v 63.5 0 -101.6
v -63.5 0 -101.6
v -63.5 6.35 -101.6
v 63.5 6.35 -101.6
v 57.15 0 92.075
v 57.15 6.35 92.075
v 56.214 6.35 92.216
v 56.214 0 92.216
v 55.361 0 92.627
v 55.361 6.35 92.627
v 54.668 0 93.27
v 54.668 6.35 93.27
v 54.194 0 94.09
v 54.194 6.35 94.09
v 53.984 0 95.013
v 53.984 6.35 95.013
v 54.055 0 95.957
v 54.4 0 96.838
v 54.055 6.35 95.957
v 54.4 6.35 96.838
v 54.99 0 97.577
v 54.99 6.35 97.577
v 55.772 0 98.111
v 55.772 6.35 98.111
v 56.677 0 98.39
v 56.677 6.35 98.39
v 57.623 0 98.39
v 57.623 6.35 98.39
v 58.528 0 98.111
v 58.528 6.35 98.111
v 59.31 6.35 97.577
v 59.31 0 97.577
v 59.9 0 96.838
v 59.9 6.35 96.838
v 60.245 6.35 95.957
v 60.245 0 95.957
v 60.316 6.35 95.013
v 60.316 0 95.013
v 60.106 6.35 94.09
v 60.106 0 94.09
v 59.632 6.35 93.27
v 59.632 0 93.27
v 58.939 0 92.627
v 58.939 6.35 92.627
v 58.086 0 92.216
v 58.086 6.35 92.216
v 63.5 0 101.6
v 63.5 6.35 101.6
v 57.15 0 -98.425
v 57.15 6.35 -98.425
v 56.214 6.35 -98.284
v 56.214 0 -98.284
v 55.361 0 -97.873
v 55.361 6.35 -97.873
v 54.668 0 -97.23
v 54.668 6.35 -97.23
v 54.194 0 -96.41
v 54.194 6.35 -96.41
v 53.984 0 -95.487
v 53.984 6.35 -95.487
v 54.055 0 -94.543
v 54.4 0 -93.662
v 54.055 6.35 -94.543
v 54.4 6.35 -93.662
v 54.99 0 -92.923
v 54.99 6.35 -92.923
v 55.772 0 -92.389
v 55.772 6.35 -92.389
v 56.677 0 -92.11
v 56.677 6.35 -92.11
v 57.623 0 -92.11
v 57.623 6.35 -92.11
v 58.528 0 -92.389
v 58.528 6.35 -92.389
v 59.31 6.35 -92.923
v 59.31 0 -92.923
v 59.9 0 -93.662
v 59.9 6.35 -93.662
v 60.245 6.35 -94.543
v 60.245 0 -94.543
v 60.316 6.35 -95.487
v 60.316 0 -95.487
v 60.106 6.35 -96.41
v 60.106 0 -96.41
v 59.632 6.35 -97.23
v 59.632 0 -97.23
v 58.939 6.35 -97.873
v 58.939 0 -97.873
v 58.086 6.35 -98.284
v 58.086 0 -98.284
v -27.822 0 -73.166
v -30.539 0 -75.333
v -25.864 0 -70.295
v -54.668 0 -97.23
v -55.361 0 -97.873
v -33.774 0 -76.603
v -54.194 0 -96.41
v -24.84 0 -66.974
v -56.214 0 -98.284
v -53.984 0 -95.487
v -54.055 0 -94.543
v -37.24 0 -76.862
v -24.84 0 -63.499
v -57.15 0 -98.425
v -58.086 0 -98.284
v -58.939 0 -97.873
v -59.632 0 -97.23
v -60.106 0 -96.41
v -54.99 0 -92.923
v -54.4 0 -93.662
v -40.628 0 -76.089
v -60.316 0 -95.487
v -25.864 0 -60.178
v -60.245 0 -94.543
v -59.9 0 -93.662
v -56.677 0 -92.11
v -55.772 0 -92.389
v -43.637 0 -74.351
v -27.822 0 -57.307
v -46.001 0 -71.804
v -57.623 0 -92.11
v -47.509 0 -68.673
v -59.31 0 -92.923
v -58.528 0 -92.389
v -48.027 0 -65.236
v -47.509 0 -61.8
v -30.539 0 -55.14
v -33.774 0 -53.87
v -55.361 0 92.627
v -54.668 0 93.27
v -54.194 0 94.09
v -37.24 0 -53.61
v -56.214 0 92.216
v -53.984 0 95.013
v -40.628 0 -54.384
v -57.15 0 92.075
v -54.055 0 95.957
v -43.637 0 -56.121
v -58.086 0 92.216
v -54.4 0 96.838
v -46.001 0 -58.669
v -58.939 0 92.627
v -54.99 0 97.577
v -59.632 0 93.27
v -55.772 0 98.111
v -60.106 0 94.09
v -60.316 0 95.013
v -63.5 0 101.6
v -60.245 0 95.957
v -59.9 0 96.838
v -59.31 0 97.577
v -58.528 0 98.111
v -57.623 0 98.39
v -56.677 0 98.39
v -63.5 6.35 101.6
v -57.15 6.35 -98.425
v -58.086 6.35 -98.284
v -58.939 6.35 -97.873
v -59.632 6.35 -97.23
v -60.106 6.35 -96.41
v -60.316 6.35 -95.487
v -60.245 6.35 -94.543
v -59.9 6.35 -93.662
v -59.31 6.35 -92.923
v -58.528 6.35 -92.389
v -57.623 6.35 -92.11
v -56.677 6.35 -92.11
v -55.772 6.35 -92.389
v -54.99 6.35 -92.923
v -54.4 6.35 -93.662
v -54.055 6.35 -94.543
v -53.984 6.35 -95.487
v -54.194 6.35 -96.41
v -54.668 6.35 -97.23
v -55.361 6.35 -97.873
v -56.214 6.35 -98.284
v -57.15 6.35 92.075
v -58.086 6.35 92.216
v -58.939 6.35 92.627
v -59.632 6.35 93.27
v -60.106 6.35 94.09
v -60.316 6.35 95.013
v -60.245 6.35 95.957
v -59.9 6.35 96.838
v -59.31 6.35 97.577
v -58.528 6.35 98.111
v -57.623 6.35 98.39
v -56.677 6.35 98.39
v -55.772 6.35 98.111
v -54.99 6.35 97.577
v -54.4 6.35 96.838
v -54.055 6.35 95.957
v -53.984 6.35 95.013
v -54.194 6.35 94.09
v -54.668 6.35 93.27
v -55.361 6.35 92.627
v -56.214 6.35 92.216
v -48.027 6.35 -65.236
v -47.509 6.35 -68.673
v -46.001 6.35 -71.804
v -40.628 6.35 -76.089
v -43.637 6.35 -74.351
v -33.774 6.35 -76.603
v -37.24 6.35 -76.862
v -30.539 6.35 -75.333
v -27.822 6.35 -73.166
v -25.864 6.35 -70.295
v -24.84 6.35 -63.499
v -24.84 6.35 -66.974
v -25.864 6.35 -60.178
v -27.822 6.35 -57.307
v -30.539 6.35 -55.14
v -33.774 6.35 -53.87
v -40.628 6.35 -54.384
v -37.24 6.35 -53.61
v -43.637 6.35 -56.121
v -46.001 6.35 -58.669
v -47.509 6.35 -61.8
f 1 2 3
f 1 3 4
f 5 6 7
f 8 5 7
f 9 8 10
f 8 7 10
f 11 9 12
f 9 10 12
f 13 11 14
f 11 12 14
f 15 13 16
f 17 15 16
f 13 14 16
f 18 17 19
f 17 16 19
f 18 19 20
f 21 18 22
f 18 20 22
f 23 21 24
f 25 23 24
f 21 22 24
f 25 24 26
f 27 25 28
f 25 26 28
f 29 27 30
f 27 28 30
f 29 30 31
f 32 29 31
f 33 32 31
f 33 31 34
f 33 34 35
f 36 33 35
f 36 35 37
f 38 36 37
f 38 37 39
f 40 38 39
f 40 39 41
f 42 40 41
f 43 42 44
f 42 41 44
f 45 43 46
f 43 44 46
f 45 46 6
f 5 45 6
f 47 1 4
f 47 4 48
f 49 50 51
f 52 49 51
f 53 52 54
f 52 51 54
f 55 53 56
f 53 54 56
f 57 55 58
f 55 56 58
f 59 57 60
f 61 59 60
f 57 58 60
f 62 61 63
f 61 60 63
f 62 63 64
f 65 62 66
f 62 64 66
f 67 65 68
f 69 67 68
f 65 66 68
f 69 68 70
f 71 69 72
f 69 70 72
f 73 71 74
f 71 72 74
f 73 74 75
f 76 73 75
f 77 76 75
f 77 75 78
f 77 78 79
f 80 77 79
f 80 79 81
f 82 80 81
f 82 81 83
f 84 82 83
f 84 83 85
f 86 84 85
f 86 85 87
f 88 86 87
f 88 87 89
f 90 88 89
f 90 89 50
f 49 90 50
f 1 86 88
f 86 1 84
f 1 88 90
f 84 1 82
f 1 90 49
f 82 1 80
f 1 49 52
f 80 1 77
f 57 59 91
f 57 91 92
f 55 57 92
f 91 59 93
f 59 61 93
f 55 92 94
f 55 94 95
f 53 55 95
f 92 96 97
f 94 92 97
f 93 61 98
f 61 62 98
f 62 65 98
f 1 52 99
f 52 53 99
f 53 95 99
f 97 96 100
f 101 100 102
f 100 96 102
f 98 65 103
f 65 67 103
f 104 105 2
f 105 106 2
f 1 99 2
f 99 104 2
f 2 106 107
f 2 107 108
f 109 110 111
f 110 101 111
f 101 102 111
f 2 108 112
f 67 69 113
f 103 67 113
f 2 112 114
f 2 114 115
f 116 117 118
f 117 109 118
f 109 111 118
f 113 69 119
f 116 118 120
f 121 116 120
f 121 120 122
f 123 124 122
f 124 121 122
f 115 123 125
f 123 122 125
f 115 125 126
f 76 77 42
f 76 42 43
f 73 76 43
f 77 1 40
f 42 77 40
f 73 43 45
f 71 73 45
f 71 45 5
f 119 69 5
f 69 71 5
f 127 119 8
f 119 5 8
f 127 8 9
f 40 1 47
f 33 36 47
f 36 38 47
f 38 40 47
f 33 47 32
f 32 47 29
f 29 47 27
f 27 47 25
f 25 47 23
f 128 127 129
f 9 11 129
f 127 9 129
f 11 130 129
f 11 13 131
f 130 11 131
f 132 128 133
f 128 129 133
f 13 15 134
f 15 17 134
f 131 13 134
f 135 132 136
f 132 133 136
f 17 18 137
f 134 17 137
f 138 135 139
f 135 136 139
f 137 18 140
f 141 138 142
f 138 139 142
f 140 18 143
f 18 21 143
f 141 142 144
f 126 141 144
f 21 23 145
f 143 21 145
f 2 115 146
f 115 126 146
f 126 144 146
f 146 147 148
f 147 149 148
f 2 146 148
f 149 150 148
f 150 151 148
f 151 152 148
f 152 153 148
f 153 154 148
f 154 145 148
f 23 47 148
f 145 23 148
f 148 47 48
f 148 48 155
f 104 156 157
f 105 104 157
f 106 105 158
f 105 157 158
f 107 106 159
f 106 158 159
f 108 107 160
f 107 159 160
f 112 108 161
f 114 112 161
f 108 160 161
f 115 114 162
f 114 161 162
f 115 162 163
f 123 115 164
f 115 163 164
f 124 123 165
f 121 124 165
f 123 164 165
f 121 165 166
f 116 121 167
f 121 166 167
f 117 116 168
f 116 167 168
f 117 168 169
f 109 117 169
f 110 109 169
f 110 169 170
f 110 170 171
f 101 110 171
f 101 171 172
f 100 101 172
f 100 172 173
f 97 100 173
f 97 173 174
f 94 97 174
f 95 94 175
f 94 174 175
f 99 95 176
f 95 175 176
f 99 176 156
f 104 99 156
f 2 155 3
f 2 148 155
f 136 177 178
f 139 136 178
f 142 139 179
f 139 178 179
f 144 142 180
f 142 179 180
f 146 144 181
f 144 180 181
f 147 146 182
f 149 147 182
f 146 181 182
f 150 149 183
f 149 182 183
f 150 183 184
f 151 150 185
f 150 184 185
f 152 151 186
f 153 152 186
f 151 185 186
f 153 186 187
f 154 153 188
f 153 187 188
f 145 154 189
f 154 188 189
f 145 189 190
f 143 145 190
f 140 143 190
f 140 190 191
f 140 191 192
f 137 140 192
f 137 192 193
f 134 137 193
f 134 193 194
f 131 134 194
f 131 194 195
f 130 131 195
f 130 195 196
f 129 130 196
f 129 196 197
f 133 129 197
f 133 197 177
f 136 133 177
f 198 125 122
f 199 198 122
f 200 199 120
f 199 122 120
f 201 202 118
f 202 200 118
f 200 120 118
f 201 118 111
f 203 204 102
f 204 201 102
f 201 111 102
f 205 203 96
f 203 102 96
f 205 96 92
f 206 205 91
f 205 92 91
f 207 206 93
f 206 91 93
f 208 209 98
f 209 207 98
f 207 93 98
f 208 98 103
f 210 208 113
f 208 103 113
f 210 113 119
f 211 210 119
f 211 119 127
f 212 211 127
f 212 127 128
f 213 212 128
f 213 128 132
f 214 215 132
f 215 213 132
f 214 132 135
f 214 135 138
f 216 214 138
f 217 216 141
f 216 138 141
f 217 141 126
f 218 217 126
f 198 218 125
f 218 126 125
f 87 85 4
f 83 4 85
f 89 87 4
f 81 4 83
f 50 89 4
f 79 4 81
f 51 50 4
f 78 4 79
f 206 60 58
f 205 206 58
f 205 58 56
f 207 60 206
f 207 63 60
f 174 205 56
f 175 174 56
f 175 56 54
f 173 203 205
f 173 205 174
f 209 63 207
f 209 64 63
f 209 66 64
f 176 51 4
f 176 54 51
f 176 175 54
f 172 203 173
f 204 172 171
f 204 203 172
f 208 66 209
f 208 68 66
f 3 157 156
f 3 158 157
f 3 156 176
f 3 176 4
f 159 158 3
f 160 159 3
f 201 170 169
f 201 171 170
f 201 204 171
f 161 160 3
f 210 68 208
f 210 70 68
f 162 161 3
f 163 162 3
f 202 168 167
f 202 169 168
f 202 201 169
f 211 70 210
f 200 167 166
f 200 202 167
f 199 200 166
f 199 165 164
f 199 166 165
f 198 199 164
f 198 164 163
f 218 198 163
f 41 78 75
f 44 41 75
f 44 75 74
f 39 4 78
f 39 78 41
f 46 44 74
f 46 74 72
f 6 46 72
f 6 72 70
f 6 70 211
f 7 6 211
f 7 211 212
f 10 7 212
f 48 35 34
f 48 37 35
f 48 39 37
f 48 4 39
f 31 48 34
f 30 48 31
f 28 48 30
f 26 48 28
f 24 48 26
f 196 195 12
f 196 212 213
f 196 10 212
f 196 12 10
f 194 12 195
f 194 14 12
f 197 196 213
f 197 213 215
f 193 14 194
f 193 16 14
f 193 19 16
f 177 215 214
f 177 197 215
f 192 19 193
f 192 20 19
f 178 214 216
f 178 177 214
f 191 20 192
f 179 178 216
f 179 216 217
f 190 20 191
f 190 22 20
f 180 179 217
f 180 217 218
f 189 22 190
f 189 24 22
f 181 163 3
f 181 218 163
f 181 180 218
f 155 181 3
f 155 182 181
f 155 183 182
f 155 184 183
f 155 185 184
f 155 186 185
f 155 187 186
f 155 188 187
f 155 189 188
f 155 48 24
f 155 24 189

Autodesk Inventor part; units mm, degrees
ref_plane "YZ Plane" through (0, 0, 0) normal (1, 0, 0) x (0, 1, 0)
ref_plane "XZ Plane" through (0, 0, 0) normal (0, 1, 0) x (-1, 0, 0)
ref_plane "XY Plane" through (0, 0, 0) normal (0, 0, 1) x (1, 0, 0)
sketch "Sketch1" plane through (0, 0, 0) normal (0, 1, 0) x (-1, 0, 0)
  line L0 (63.5, -101.6) -> (-63.5, -101.6)
  line L1 (-63.5, -101.6) -> (-63.5, 101.6)
  line L2 (-63.5, 101.6) -> (63.5, 101.6)
  line L3 (63.5, 101.6) -> (63.5, -101.6)
  line L4 (63.5, -101.6) -> (-63.5, 101.6) construction
  line L5 (-63.5, -101.6) -> (63.5, 101.6) construction
  circle A0 centre (36.3684, -65.2364) radius 11.6586
  line L6 (57.15, 95.25) -> (-57.15, 95.25)
  line L7 (-57.15, 95.25) -> (-57.15, -95.25)
  line L8 (-57.15, -95.25) -> (57.15, -95.25)
  line L9 (57.15, -95.25) -> (57.15, 95.25)
  line L10 (57.15, 95.25) -> (-57.15, -95.25) construction
  line L11 (-57.15, 95.25) -> (57.15, -95.25) construction
  point P0 (0, 0)
  dimension "d0" = 127
  dimension "d1" = 203.2
  dimension "d4" = 23.3172
  dimension "d7" = 114.3
  dimension "d8" = 190.5
extrude "Extrusion2" add sketch "Sketch1" along normal blind 6.35 contours L0 L1 L2 L3 | L9 L8 L7 L6
hole "Hole1" at (57.15, 0, -95.25) at (-57.15, 0, -95.25) at (-57.15, 0, 95.25) at (57.15, 0, 95.25) direction (0, 1, 0) diameter 6.35 end through all
properties part number "eboardpartisland"
